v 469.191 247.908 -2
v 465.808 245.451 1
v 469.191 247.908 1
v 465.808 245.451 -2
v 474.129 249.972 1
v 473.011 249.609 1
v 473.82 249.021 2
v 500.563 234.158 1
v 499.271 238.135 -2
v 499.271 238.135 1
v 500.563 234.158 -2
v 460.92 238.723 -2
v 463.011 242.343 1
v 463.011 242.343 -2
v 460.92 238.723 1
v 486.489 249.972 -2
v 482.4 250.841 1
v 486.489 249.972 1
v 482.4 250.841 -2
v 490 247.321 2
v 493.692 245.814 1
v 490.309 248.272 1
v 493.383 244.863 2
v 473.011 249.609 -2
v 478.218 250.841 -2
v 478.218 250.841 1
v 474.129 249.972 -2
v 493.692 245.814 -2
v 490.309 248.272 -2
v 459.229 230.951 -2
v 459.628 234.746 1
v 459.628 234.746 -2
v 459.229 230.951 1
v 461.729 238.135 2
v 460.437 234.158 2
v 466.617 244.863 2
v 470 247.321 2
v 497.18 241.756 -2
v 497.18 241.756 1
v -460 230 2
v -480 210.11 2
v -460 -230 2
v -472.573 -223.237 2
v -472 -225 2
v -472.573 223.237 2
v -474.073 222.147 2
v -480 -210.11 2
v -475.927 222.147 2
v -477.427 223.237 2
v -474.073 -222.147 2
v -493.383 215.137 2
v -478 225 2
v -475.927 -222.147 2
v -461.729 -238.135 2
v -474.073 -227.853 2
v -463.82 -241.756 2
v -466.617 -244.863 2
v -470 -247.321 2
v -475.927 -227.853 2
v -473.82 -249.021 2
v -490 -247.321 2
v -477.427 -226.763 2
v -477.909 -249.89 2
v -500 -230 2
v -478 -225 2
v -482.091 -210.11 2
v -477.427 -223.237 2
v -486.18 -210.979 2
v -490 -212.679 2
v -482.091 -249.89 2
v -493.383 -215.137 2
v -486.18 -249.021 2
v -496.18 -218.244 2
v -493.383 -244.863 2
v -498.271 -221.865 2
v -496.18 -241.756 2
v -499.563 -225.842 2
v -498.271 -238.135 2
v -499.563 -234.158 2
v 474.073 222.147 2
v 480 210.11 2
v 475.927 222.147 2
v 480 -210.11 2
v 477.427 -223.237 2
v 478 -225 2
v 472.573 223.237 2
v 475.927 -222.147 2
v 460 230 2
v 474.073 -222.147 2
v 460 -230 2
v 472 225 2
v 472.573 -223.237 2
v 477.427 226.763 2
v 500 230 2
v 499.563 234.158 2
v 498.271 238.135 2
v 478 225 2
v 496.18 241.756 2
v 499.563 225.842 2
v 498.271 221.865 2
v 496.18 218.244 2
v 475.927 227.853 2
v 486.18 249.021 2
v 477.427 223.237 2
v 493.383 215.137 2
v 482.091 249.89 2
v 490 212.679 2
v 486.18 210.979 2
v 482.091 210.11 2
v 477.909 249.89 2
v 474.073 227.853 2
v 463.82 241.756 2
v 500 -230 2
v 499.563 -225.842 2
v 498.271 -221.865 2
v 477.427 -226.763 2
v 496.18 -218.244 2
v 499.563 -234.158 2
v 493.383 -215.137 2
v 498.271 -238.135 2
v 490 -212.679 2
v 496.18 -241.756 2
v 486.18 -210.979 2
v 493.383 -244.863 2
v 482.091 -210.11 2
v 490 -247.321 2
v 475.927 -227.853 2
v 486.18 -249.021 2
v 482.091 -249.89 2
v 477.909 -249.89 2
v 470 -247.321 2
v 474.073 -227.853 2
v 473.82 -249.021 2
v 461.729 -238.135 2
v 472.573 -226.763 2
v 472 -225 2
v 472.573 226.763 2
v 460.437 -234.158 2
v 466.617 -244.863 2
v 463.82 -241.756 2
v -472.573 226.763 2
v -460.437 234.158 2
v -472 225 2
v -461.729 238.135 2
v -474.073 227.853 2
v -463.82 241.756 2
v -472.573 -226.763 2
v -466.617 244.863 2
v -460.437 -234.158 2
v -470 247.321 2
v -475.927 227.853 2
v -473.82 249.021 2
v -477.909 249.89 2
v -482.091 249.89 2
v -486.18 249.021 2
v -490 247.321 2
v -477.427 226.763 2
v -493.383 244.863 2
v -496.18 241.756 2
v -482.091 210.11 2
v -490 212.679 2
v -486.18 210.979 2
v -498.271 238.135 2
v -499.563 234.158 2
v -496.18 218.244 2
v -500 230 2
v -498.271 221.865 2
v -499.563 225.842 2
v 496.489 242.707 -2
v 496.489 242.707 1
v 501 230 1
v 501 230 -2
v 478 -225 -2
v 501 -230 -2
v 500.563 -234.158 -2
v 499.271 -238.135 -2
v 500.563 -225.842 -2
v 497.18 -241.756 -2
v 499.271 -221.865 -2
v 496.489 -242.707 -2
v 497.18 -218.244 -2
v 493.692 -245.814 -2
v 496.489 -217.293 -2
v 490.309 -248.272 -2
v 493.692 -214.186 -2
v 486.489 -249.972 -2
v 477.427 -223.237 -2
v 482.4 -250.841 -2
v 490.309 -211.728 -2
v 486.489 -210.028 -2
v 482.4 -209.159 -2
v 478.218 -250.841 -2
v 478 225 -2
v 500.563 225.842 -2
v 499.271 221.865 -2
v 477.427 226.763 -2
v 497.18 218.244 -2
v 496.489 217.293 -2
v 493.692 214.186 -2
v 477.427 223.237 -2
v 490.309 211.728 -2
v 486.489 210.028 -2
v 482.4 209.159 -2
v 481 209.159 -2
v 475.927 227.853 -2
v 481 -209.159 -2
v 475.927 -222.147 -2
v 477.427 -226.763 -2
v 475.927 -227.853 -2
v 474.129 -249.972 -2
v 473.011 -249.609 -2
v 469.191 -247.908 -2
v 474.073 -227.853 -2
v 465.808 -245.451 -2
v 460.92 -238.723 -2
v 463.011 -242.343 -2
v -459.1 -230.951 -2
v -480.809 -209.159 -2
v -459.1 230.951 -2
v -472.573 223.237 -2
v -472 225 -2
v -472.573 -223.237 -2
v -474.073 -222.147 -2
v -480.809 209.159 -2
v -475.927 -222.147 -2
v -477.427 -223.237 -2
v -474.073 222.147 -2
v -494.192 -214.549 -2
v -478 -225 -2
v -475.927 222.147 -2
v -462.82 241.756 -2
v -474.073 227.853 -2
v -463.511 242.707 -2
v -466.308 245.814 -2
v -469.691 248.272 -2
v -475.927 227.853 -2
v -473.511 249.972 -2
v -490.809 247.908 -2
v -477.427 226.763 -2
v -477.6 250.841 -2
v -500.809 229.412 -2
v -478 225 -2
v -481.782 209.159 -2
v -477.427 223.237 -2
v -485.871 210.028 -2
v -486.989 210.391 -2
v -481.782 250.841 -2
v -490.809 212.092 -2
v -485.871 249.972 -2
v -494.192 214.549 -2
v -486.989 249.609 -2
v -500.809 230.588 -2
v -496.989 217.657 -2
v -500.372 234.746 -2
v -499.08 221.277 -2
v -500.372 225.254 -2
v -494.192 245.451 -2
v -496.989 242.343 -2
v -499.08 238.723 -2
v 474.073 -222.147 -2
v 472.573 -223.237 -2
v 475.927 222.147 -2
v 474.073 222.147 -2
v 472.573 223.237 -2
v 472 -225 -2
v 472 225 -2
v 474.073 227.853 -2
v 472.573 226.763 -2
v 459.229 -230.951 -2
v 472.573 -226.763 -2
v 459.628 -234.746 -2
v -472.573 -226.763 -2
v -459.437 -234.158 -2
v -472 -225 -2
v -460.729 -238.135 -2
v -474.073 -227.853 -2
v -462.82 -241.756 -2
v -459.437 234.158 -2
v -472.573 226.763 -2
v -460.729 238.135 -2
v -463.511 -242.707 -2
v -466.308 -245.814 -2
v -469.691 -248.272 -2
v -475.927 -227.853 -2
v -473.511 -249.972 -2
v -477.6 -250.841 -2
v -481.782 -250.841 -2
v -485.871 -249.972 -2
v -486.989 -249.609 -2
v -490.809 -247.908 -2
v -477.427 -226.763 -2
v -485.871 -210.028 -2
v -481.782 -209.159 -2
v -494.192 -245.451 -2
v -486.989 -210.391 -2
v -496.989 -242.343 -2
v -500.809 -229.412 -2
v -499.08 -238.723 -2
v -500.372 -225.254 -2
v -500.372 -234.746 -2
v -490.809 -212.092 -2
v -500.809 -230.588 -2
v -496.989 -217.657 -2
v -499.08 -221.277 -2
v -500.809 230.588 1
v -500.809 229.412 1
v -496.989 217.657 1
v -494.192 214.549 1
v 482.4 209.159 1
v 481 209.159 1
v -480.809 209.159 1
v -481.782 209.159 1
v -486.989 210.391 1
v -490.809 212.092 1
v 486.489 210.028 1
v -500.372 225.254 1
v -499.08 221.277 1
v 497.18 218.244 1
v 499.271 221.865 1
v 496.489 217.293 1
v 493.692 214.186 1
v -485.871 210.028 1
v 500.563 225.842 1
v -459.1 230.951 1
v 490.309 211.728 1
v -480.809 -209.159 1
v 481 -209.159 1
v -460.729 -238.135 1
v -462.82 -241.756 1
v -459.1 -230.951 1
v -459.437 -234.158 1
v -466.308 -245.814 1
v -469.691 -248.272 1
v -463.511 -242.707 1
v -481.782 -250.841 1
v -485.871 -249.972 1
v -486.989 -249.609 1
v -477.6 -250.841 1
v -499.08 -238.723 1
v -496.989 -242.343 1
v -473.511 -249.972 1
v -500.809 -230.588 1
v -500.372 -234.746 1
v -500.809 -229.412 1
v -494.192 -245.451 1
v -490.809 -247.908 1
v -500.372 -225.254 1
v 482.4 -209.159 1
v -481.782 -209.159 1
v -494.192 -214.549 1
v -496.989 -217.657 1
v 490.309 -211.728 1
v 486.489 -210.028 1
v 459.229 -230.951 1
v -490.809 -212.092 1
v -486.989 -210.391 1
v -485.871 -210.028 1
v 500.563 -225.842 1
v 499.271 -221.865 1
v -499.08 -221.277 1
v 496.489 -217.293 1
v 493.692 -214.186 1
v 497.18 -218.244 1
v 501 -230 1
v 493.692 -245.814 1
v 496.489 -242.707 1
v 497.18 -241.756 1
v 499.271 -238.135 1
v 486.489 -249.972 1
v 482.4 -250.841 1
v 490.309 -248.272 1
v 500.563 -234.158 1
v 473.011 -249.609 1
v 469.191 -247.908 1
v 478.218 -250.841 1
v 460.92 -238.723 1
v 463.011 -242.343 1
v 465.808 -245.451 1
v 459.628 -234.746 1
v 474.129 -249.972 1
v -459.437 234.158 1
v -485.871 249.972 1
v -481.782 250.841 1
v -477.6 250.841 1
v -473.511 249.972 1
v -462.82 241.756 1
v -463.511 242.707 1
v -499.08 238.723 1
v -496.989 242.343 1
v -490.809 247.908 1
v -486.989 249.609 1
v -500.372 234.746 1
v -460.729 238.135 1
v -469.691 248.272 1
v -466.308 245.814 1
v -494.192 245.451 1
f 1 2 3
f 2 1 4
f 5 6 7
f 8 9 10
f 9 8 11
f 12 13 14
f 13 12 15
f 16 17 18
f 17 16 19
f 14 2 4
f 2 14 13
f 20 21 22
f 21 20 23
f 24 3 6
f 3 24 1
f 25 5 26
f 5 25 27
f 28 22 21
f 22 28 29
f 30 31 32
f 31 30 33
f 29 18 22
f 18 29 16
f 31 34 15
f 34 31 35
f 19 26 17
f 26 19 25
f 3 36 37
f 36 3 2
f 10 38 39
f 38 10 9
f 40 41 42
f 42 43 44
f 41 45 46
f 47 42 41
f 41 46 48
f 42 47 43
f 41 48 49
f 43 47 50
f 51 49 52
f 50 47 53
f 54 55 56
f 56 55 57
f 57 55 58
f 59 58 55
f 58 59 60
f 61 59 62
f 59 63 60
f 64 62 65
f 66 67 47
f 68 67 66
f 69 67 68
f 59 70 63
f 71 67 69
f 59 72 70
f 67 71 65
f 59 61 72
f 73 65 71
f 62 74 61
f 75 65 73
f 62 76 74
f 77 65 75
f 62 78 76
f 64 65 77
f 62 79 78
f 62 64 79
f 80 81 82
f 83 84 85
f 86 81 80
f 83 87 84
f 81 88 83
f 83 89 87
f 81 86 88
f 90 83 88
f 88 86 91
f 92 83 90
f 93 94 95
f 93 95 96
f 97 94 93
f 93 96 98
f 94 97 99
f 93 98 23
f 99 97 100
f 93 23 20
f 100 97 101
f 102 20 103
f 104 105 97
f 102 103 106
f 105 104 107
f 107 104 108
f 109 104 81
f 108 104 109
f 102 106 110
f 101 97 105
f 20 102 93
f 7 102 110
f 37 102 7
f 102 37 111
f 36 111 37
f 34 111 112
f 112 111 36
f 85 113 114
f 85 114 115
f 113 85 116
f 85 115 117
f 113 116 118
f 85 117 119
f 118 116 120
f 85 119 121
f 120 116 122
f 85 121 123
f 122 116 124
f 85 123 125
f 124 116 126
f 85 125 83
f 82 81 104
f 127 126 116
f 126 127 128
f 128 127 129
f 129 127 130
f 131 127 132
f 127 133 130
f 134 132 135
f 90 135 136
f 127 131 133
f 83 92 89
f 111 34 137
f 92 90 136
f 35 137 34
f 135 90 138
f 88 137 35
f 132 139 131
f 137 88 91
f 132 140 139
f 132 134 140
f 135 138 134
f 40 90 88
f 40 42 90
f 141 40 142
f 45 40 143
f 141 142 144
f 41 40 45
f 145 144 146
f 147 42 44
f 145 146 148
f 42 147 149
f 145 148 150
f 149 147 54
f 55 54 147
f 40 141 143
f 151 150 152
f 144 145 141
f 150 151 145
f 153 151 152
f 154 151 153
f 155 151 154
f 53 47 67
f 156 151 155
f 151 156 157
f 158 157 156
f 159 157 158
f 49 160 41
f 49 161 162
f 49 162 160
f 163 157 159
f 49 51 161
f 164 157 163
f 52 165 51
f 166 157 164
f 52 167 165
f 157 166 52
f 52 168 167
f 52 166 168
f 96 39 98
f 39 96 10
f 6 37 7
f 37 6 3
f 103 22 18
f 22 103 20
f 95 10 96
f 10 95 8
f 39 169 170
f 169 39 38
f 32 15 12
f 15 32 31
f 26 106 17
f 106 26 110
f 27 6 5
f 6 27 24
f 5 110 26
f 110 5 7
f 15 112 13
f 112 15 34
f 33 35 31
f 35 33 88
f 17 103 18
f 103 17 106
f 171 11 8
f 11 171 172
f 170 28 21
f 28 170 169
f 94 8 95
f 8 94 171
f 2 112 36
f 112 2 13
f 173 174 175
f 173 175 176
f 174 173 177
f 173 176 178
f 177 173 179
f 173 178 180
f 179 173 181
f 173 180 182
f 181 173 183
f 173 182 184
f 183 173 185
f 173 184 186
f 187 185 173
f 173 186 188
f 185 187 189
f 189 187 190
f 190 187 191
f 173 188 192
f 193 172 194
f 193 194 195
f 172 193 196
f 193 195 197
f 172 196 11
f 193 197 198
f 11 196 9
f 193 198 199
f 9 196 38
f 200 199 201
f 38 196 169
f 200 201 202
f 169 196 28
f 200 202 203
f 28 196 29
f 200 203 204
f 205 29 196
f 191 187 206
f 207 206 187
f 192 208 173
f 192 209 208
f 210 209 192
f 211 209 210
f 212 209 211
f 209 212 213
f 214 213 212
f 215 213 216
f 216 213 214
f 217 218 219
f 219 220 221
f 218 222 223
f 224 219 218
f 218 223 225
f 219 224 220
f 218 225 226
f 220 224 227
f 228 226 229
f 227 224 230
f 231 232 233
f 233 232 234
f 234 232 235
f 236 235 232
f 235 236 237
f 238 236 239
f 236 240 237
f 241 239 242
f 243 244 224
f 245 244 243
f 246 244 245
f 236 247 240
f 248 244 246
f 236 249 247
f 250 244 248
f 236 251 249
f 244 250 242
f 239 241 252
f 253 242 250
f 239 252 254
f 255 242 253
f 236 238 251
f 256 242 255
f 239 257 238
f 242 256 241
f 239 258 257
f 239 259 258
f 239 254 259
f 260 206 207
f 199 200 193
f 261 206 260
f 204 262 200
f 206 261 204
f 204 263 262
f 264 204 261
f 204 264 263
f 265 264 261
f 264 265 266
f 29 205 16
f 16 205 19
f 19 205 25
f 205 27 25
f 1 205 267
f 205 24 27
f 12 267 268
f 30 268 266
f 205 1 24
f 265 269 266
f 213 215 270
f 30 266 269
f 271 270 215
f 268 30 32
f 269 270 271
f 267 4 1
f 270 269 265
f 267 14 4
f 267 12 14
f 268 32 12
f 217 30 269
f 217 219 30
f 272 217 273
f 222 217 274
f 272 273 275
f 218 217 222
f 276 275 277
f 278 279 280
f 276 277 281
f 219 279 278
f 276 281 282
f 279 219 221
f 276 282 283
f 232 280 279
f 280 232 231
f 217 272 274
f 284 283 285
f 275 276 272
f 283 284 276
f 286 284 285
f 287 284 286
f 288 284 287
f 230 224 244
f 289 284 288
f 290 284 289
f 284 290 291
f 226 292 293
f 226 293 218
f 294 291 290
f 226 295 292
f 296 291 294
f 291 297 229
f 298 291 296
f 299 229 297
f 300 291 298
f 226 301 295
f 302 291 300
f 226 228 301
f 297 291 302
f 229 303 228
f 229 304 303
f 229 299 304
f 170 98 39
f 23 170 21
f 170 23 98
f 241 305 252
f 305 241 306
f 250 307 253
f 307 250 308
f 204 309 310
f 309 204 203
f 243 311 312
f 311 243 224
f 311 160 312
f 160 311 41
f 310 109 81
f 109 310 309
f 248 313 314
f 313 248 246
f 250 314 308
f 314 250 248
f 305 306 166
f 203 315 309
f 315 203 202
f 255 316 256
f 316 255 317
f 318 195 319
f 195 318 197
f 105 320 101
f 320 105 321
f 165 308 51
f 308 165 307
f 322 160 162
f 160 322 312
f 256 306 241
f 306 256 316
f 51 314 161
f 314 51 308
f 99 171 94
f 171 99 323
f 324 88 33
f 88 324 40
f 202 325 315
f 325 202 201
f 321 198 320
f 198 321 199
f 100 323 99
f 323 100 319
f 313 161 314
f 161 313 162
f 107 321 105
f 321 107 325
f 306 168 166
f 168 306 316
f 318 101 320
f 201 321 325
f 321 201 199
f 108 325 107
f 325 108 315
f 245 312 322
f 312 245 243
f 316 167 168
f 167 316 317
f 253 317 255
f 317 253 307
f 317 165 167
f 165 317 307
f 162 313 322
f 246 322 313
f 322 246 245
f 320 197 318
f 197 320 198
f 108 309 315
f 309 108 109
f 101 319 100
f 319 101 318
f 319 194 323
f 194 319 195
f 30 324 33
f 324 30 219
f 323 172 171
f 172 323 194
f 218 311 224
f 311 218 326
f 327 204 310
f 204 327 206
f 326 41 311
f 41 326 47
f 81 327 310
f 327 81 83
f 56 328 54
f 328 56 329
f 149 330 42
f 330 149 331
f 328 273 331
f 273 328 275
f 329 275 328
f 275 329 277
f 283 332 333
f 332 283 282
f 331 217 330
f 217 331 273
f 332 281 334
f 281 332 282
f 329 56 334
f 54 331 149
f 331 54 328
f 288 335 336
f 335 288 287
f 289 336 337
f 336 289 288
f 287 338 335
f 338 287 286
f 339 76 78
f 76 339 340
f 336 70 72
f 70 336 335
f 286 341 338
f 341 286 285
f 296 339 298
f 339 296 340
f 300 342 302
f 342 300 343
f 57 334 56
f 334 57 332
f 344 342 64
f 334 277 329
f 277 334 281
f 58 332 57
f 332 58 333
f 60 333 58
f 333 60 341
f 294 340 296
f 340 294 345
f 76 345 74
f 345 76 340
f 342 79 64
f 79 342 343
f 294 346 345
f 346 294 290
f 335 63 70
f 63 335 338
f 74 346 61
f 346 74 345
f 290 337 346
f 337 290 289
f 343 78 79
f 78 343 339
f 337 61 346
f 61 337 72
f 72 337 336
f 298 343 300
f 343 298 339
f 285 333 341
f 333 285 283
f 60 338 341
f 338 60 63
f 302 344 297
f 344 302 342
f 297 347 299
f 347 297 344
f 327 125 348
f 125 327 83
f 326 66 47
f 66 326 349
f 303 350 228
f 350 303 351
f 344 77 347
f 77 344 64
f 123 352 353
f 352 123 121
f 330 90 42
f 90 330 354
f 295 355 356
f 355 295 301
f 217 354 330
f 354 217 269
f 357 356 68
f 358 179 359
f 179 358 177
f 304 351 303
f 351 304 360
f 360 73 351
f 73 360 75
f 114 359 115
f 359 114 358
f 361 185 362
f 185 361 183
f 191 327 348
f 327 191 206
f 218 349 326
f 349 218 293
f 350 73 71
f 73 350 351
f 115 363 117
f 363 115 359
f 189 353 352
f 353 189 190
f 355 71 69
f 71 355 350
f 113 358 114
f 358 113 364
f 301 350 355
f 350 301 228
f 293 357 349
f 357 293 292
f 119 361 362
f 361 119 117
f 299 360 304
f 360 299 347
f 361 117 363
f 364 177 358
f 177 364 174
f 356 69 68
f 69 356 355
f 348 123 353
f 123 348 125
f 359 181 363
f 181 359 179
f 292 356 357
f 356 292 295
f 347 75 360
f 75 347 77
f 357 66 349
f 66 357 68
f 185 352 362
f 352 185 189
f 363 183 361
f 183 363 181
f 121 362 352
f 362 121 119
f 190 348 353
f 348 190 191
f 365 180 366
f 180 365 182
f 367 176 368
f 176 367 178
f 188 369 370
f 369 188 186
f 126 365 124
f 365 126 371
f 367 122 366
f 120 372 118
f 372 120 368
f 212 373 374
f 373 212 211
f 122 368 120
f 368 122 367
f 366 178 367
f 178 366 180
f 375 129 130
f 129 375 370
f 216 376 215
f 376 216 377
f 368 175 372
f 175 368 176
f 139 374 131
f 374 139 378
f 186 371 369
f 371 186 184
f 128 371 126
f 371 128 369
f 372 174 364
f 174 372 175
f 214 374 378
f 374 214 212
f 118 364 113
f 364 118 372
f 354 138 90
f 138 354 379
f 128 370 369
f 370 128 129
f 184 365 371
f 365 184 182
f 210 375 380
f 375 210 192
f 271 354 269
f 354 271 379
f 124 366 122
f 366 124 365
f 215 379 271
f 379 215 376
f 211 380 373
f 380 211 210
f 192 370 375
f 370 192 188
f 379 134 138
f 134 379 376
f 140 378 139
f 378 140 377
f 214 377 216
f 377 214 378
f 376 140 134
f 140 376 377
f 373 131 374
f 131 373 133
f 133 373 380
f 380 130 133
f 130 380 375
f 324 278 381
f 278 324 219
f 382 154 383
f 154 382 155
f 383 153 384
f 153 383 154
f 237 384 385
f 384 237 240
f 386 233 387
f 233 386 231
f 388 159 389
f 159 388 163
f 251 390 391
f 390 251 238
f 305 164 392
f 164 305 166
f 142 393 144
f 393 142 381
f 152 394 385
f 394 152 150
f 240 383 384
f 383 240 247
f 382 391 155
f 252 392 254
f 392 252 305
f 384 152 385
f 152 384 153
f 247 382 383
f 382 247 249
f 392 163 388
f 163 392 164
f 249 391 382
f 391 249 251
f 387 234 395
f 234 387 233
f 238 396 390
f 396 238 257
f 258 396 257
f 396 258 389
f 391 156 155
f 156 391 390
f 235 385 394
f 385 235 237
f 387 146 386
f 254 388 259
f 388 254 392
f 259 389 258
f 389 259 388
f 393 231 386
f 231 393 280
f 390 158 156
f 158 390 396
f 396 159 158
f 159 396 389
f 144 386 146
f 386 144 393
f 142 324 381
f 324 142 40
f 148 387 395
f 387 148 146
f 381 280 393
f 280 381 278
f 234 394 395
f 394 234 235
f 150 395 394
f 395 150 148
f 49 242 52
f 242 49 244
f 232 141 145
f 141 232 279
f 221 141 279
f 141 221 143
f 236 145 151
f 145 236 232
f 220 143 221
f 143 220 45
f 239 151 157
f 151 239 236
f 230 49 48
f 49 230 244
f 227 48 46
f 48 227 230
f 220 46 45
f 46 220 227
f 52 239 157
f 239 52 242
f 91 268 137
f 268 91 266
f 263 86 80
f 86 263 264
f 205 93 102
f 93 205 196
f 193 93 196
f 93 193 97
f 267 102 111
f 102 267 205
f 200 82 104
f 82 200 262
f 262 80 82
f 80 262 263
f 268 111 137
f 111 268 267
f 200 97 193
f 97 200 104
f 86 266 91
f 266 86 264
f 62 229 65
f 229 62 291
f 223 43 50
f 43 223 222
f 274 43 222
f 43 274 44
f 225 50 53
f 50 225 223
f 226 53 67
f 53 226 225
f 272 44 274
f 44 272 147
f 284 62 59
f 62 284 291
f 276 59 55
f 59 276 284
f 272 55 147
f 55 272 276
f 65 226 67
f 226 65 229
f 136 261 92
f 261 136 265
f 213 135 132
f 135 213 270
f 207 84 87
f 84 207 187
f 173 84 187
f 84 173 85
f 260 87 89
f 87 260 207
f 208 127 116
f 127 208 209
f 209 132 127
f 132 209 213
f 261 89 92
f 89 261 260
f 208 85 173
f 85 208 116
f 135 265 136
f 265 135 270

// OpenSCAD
// Parameters
sheet_L = 1000; //[500:2000:1]
sheet_W = 500; //[250:1000:1]
sheet_T = 3; //[1.5:6:0.1]
corner_R = 20; //[10:40:1]
chamfer_C = 1; //[0.5:3:0.1]
hole_d = 6; //[3:12:0.5]
hole_edge_offset = 25; //[10:60:1]
hole_clearance_z = 2; //[1:10:0.5]

// Base shapes
module sheet_panel_base() {
  cube([sheet_L - 2*corner_R, sheet_W - 2*corner_R, sheet_T], center=true);
}

module corner_rounding_cyl() {
  cylinder(r=corner_R, h=sheet_T, center=true);
}

module edge_chamfer_bevel() {
  cylinder(r1=chamfer_C, r2=0, h=chamfer_C, center=true);
}

module mounting_hole_cutter() {
  cylinder(r=hole_d/2, h=sheet_T + hole_clearance_z, center=true);
}

// Operations
module corner_rounding() {
  union() {
    sheet_panel_base();
    translate([-(sheet_L/2 - corner_R), (sheet_W/2 - corner_R), 0]) corner_rounding_cyl();
    translate([(sheet_L/2 - corner_R), (sheet_W/2 - corner_R), 0]) corner_rounding_cyl();
    translate([-(sheet_L/2 - corner_R), -(sheet_W/2 - corner_R), 0]) corner_rounding_cyl();
    translate([(sheet_L/2 - corner_R), -(sheet_W/2 - corner_R), 0]) corner_rounding_cyl();
  }
}

module edge_chamfer() {
  minkowski() {
    corner_rounding();
    edge_chamfer_bevel();
  }
}

module complete_model() {
  difference() {
    edge_chamfer();
    translate([-(sheet_L/2 - hole_edge_offset), (sheet_W/2 - hole_edge_offset), 0]) mounting_hole_cutter();
    translate([(sheet_L/2 - hole_edge_offset), (sheet_W/2 - hole_edge_offset), 0]) mounting_hole_cutter();
    translate([-(sheet_L/2 - hole_edge_offset), -(sheet_W/2 - hole_edge_offset), 0]) mounting_hole_cutter();
    translate([(sheet_L/2 - hole_edge_offset), -(sheet_W/2 - hole_edge_offset), 0]) mounting_hole_cutter();
  }
}

// Final output
complete_model();
